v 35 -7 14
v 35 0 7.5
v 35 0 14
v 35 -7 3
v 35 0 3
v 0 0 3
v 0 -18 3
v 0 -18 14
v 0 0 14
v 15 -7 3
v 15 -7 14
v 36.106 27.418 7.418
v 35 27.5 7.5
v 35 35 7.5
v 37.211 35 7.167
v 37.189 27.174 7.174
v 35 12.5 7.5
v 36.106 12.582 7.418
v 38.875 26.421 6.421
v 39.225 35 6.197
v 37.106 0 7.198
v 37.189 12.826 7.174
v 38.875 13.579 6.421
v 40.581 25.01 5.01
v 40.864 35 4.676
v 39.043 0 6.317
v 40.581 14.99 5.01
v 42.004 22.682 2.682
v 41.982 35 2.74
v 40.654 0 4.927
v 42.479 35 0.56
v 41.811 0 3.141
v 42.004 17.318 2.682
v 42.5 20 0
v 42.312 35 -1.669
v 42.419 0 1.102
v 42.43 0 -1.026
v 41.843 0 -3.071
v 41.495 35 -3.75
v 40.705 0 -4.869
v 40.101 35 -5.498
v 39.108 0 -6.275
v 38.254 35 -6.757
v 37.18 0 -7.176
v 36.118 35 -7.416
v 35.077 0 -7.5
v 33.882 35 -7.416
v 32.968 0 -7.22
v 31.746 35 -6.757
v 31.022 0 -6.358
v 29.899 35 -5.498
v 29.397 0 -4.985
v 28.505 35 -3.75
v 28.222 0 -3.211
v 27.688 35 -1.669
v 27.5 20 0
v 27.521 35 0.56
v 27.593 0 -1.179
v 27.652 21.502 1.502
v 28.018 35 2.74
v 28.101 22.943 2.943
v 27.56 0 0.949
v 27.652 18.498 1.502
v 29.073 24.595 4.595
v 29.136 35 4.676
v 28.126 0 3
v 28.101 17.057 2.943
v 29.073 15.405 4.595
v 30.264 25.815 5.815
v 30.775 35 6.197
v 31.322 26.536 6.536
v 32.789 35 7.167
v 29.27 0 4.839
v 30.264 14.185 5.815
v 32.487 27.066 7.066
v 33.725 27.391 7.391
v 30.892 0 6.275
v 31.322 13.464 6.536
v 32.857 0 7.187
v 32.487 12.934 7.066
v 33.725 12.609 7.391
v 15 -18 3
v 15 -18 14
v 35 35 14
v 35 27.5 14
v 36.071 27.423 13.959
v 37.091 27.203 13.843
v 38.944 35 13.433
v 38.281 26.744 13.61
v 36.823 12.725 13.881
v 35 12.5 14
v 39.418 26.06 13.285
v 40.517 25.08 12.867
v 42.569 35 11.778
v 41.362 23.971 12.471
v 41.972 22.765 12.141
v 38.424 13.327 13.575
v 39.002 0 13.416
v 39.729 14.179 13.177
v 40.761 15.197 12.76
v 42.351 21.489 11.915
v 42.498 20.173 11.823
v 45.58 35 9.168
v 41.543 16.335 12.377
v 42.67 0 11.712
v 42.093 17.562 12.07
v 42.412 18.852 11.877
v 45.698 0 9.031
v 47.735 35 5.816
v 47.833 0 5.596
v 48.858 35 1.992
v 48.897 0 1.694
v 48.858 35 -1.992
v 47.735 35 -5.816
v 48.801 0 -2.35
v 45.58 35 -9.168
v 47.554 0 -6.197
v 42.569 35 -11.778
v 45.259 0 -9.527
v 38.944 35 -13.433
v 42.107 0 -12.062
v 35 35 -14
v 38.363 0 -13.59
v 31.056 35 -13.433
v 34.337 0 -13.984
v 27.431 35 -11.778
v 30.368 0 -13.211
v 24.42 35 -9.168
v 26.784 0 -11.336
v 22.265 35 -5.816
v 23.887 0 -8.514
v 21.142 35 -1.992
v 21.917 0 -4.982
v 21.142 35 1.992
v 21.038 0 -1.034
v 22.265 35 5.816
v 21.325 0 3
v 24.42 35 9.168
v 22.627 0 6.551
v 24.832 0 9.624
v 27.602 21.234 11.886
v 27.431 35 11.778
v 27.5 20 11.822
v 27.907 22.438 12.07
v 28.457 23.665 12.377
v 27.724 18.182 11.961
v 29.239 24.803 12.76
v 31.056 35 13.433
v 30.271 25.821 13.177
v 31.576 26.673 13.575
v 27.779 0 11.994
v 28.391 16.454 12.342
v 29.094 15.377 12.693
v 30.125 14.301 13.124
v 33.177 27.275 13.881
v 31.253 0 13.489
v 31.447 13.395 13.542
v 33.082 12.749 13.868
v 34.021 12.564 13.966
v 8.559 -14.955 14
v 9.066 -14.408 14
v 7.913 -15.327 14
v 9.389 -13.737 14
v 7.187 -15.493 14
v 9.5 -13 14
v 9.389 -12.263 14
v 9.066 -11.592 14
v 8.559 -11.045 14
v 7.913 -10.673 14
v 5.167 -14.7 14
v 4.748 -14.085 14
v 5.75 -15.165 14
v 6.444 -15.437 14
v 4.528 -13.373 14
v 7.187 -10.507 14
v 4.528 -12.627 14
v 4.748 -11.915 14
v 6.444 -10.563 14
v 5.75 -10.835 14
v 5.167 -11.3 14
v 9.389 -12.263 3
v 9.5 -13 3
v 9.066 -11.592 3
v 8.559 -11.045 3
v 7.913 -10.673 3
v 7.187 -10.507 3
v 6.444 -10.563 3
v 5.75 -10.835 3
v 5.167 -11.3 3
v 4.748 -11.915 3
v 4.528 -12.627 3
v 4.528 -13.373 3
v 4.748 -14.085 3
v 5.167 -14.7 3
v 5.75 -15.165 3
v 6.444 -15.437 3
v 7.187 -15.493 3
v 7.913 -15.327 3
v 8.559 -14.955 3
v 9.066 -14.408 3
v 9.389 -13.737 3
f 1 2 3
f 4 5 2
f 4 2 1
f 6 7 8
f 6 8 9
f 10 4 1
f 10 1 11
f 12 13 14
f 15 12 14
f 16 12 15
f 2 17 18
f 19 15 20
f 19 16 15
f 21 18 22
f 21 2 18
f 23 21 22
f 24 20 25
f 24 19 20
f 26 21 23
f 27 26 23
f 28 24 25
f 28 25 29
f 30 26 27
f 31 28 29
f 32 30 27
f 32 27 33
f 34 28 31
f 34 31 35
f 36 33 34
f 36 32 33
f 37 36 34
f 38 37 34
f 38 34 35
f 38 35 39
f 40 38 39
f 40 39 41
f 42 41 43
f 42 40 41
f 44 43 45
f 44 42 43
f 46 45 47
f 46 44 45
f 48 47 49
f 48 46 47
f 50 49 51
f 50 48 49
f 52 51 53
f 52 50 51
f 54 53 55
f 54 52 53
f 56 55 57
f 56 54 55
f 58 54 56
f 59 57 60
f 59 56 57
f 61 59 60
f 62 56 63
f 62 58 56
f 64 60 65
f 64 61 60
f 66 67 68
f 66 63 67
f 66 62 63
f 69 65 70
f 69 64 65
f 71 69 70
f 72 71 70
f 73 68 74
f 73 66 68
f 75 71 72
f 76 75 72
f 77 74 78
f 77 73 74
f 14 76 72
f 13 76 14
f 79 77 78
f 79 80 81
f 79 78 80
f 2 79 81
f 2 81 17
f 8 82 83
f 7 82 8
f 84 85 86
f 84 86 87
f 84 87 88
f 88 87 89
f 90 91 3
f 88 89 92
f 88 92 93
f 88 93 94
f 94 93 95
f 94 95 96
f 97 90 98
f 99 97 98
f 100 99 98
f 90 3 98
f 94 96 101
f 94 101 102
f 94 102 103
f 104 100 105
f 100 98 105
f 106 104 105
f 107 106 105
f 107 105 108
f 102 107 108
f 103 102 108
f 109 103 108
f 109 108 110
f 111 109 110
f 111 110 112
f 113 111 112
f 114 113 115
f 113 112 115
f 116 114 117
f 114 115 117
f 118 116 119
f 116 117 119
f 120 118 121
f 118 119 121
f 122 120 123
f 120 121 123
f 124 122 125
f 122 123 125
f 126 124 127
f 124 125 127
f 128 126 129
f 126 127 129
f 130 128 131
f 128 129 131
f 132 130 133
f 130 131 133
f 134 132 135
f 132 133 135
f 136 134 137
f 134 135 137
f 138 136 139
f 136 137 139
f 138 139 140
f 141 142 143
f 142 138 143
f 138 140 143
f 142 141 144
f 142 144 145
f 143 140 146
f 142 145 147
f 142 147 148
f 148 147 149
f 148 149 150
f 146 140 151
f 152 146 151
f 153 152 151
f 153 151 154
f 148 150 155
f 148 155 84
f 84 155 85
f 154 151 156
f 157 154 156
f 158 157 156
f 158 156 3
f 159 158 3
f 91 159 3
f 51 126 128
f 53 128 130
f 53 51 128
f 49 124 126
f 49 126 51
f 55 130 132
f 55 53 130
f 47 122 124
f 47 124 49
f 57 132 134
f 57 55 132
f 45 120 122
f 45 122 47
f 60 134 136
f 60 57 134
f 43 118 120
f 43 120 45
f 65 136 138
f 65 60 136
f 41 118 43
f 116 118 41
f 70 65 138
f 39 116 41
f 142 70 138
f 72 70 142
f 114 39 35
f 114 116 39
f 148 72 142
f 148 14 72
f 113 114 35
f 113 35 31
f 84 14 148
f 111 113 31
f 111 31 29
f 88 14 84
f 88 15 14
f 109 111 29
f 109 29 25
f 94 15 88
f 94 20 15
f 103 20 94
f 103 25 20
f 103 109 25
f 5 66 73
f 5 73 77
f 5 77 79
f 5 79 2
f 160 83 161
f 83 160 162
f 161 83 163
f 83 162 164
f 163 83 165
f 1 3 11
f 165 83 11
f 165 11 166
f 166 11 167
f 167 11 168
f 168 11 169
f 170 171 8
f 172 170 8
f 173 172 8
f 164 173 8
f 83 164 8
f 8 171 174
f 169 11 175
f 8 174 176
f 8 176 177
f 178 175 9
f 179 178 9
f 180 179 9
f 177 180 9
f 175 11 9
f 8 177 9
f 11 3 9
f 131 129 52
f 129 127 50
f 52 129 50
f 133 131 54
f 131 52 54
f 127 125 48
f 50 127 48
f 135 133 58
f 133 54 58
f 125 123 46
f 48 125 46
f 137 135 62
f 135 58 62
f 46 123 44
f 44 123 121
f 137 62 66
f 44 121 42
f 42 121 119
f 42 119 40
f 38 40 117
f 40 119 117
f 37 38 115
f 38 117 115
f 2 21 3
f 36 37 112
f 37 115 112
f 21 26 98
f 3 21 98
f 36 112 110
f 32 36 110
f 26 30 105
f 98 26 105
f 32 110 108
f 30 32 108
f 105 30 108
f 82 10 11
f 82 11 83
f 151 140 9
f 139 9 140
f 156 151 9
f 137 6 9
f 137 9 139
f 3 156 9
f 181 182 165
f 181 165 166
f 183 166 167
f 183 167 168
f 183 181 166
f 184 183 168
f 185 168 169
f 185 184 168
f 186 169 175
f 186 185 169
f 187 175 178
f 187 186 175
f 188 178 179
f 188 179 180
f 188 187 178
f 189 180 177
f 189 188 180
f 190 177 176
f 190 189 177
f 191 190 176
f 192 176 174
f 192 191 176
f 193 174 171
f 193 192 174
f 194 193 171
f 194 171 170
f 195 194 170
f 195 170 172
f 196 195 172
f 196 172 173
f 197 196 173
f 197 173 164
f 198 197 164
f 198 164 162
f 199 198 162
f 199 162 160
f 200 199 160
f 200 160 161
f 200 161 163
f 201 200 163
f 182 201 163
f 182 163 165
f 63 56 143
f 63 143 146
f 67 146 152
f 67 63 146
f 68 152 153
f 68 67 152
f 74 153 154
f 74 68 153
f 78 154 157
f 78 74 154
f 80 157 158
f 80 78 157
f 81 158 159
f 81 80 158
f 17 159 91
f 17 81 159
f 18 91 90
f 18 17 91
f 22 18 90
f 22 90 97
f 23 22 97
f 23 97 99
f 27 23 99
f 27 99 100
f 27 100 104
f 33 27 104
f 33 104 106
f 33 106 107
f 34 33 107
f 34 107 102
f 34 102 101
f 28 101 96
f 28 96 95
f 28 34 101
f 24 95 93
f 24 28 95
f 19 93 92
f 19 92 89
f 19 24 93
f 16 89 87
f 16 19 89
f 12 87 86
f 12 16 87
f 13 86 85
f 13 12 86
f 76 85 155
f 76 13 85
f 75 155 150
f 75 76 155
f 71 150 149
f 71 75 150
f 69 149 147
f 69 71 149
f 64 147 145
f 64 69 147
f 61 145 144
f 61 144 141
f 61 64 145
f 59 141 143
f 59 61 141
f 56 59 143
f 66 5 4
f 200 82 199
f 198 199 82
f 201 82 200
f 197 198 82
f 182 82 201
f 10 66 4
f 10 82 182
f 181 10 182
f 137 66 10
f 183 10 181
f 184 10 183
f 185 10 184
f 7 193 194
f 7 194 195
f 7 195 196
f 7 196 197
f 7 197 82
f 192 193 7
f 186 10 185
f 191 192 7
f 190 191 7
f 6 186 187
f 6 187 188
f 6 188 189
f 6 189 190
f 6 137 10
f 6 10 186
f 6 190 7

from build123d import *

# Parameters (mm, degrees)
SKETCH_1_R          = 14
SKETCH_1_R_2        = 7.5
EXTRUDE_1_DEPTH     = 35
SKETCH_2_R          = 7.5
CUT_EXTRUDE_1_DEPTH = 35
SKETCH_3_R          = 2.5
EXTRUDE_2_DEPTH     = 14
SKETCH_3_2_R        = 2.5
CUT_EXTRUDE_2_DEPTH = 3


with BuildPart() as part:
    # 草图1 → 凸台-拉伸1 (new body)
    with BuildSketch(Plane(origin=(0, 0, 0), x_dir=(1, 0, 0), z_dir=(0, 1, 0))):
        with Locations((35, 0)):
            Circle(SKETCH_1_R)
        with Locations((35, 0)):
            Circle(SKETCH_1_R_2, mode=Mode.SUBTRACT)
    extrude(amount=EXTRUDE_1_DEPTH)

    # 草图2 → 切除-拉伸1 (cut)
    with BuildSketch(Plane.XY):
        with Locations((35, 20)):
            Circle(SKETCH_2_R)
    extrude(amount=CUT_EXTRUDE_1_DEPTH, mode=Mode.SUBTRACT)

    # 草图3 → 凸台-拉伸2 (add)
    with BuildSketch(Plane.XY):
        Polygon((0, 0), (35, 0), (35, -7), (15, -7), (15, -18), (0, -18), align=None)
        with Locations((7, -13)):
            Circle(SKETCH_3_R, mode=Mode.SUBTRACT)
    extrude(amount=EXTRUDE_2_DEPTH)

    # 草图3<2> → 切除-拉伸2 (cut)
    with BuildSketch(Plane.XY):
        Polygon((0, 0), (35, 0), (35, -7), (15, -7), (15, -18), (0, -18), align=None)
        with Locations((7, -13)):
            Circle(SKETCH_3_2_R, mode=Mode.SUBTRACT)
    extrude(amount=CUT_EXTRUDE_2_DEPTH, mode=Mode.SUBTRACT)


solid = part.part
